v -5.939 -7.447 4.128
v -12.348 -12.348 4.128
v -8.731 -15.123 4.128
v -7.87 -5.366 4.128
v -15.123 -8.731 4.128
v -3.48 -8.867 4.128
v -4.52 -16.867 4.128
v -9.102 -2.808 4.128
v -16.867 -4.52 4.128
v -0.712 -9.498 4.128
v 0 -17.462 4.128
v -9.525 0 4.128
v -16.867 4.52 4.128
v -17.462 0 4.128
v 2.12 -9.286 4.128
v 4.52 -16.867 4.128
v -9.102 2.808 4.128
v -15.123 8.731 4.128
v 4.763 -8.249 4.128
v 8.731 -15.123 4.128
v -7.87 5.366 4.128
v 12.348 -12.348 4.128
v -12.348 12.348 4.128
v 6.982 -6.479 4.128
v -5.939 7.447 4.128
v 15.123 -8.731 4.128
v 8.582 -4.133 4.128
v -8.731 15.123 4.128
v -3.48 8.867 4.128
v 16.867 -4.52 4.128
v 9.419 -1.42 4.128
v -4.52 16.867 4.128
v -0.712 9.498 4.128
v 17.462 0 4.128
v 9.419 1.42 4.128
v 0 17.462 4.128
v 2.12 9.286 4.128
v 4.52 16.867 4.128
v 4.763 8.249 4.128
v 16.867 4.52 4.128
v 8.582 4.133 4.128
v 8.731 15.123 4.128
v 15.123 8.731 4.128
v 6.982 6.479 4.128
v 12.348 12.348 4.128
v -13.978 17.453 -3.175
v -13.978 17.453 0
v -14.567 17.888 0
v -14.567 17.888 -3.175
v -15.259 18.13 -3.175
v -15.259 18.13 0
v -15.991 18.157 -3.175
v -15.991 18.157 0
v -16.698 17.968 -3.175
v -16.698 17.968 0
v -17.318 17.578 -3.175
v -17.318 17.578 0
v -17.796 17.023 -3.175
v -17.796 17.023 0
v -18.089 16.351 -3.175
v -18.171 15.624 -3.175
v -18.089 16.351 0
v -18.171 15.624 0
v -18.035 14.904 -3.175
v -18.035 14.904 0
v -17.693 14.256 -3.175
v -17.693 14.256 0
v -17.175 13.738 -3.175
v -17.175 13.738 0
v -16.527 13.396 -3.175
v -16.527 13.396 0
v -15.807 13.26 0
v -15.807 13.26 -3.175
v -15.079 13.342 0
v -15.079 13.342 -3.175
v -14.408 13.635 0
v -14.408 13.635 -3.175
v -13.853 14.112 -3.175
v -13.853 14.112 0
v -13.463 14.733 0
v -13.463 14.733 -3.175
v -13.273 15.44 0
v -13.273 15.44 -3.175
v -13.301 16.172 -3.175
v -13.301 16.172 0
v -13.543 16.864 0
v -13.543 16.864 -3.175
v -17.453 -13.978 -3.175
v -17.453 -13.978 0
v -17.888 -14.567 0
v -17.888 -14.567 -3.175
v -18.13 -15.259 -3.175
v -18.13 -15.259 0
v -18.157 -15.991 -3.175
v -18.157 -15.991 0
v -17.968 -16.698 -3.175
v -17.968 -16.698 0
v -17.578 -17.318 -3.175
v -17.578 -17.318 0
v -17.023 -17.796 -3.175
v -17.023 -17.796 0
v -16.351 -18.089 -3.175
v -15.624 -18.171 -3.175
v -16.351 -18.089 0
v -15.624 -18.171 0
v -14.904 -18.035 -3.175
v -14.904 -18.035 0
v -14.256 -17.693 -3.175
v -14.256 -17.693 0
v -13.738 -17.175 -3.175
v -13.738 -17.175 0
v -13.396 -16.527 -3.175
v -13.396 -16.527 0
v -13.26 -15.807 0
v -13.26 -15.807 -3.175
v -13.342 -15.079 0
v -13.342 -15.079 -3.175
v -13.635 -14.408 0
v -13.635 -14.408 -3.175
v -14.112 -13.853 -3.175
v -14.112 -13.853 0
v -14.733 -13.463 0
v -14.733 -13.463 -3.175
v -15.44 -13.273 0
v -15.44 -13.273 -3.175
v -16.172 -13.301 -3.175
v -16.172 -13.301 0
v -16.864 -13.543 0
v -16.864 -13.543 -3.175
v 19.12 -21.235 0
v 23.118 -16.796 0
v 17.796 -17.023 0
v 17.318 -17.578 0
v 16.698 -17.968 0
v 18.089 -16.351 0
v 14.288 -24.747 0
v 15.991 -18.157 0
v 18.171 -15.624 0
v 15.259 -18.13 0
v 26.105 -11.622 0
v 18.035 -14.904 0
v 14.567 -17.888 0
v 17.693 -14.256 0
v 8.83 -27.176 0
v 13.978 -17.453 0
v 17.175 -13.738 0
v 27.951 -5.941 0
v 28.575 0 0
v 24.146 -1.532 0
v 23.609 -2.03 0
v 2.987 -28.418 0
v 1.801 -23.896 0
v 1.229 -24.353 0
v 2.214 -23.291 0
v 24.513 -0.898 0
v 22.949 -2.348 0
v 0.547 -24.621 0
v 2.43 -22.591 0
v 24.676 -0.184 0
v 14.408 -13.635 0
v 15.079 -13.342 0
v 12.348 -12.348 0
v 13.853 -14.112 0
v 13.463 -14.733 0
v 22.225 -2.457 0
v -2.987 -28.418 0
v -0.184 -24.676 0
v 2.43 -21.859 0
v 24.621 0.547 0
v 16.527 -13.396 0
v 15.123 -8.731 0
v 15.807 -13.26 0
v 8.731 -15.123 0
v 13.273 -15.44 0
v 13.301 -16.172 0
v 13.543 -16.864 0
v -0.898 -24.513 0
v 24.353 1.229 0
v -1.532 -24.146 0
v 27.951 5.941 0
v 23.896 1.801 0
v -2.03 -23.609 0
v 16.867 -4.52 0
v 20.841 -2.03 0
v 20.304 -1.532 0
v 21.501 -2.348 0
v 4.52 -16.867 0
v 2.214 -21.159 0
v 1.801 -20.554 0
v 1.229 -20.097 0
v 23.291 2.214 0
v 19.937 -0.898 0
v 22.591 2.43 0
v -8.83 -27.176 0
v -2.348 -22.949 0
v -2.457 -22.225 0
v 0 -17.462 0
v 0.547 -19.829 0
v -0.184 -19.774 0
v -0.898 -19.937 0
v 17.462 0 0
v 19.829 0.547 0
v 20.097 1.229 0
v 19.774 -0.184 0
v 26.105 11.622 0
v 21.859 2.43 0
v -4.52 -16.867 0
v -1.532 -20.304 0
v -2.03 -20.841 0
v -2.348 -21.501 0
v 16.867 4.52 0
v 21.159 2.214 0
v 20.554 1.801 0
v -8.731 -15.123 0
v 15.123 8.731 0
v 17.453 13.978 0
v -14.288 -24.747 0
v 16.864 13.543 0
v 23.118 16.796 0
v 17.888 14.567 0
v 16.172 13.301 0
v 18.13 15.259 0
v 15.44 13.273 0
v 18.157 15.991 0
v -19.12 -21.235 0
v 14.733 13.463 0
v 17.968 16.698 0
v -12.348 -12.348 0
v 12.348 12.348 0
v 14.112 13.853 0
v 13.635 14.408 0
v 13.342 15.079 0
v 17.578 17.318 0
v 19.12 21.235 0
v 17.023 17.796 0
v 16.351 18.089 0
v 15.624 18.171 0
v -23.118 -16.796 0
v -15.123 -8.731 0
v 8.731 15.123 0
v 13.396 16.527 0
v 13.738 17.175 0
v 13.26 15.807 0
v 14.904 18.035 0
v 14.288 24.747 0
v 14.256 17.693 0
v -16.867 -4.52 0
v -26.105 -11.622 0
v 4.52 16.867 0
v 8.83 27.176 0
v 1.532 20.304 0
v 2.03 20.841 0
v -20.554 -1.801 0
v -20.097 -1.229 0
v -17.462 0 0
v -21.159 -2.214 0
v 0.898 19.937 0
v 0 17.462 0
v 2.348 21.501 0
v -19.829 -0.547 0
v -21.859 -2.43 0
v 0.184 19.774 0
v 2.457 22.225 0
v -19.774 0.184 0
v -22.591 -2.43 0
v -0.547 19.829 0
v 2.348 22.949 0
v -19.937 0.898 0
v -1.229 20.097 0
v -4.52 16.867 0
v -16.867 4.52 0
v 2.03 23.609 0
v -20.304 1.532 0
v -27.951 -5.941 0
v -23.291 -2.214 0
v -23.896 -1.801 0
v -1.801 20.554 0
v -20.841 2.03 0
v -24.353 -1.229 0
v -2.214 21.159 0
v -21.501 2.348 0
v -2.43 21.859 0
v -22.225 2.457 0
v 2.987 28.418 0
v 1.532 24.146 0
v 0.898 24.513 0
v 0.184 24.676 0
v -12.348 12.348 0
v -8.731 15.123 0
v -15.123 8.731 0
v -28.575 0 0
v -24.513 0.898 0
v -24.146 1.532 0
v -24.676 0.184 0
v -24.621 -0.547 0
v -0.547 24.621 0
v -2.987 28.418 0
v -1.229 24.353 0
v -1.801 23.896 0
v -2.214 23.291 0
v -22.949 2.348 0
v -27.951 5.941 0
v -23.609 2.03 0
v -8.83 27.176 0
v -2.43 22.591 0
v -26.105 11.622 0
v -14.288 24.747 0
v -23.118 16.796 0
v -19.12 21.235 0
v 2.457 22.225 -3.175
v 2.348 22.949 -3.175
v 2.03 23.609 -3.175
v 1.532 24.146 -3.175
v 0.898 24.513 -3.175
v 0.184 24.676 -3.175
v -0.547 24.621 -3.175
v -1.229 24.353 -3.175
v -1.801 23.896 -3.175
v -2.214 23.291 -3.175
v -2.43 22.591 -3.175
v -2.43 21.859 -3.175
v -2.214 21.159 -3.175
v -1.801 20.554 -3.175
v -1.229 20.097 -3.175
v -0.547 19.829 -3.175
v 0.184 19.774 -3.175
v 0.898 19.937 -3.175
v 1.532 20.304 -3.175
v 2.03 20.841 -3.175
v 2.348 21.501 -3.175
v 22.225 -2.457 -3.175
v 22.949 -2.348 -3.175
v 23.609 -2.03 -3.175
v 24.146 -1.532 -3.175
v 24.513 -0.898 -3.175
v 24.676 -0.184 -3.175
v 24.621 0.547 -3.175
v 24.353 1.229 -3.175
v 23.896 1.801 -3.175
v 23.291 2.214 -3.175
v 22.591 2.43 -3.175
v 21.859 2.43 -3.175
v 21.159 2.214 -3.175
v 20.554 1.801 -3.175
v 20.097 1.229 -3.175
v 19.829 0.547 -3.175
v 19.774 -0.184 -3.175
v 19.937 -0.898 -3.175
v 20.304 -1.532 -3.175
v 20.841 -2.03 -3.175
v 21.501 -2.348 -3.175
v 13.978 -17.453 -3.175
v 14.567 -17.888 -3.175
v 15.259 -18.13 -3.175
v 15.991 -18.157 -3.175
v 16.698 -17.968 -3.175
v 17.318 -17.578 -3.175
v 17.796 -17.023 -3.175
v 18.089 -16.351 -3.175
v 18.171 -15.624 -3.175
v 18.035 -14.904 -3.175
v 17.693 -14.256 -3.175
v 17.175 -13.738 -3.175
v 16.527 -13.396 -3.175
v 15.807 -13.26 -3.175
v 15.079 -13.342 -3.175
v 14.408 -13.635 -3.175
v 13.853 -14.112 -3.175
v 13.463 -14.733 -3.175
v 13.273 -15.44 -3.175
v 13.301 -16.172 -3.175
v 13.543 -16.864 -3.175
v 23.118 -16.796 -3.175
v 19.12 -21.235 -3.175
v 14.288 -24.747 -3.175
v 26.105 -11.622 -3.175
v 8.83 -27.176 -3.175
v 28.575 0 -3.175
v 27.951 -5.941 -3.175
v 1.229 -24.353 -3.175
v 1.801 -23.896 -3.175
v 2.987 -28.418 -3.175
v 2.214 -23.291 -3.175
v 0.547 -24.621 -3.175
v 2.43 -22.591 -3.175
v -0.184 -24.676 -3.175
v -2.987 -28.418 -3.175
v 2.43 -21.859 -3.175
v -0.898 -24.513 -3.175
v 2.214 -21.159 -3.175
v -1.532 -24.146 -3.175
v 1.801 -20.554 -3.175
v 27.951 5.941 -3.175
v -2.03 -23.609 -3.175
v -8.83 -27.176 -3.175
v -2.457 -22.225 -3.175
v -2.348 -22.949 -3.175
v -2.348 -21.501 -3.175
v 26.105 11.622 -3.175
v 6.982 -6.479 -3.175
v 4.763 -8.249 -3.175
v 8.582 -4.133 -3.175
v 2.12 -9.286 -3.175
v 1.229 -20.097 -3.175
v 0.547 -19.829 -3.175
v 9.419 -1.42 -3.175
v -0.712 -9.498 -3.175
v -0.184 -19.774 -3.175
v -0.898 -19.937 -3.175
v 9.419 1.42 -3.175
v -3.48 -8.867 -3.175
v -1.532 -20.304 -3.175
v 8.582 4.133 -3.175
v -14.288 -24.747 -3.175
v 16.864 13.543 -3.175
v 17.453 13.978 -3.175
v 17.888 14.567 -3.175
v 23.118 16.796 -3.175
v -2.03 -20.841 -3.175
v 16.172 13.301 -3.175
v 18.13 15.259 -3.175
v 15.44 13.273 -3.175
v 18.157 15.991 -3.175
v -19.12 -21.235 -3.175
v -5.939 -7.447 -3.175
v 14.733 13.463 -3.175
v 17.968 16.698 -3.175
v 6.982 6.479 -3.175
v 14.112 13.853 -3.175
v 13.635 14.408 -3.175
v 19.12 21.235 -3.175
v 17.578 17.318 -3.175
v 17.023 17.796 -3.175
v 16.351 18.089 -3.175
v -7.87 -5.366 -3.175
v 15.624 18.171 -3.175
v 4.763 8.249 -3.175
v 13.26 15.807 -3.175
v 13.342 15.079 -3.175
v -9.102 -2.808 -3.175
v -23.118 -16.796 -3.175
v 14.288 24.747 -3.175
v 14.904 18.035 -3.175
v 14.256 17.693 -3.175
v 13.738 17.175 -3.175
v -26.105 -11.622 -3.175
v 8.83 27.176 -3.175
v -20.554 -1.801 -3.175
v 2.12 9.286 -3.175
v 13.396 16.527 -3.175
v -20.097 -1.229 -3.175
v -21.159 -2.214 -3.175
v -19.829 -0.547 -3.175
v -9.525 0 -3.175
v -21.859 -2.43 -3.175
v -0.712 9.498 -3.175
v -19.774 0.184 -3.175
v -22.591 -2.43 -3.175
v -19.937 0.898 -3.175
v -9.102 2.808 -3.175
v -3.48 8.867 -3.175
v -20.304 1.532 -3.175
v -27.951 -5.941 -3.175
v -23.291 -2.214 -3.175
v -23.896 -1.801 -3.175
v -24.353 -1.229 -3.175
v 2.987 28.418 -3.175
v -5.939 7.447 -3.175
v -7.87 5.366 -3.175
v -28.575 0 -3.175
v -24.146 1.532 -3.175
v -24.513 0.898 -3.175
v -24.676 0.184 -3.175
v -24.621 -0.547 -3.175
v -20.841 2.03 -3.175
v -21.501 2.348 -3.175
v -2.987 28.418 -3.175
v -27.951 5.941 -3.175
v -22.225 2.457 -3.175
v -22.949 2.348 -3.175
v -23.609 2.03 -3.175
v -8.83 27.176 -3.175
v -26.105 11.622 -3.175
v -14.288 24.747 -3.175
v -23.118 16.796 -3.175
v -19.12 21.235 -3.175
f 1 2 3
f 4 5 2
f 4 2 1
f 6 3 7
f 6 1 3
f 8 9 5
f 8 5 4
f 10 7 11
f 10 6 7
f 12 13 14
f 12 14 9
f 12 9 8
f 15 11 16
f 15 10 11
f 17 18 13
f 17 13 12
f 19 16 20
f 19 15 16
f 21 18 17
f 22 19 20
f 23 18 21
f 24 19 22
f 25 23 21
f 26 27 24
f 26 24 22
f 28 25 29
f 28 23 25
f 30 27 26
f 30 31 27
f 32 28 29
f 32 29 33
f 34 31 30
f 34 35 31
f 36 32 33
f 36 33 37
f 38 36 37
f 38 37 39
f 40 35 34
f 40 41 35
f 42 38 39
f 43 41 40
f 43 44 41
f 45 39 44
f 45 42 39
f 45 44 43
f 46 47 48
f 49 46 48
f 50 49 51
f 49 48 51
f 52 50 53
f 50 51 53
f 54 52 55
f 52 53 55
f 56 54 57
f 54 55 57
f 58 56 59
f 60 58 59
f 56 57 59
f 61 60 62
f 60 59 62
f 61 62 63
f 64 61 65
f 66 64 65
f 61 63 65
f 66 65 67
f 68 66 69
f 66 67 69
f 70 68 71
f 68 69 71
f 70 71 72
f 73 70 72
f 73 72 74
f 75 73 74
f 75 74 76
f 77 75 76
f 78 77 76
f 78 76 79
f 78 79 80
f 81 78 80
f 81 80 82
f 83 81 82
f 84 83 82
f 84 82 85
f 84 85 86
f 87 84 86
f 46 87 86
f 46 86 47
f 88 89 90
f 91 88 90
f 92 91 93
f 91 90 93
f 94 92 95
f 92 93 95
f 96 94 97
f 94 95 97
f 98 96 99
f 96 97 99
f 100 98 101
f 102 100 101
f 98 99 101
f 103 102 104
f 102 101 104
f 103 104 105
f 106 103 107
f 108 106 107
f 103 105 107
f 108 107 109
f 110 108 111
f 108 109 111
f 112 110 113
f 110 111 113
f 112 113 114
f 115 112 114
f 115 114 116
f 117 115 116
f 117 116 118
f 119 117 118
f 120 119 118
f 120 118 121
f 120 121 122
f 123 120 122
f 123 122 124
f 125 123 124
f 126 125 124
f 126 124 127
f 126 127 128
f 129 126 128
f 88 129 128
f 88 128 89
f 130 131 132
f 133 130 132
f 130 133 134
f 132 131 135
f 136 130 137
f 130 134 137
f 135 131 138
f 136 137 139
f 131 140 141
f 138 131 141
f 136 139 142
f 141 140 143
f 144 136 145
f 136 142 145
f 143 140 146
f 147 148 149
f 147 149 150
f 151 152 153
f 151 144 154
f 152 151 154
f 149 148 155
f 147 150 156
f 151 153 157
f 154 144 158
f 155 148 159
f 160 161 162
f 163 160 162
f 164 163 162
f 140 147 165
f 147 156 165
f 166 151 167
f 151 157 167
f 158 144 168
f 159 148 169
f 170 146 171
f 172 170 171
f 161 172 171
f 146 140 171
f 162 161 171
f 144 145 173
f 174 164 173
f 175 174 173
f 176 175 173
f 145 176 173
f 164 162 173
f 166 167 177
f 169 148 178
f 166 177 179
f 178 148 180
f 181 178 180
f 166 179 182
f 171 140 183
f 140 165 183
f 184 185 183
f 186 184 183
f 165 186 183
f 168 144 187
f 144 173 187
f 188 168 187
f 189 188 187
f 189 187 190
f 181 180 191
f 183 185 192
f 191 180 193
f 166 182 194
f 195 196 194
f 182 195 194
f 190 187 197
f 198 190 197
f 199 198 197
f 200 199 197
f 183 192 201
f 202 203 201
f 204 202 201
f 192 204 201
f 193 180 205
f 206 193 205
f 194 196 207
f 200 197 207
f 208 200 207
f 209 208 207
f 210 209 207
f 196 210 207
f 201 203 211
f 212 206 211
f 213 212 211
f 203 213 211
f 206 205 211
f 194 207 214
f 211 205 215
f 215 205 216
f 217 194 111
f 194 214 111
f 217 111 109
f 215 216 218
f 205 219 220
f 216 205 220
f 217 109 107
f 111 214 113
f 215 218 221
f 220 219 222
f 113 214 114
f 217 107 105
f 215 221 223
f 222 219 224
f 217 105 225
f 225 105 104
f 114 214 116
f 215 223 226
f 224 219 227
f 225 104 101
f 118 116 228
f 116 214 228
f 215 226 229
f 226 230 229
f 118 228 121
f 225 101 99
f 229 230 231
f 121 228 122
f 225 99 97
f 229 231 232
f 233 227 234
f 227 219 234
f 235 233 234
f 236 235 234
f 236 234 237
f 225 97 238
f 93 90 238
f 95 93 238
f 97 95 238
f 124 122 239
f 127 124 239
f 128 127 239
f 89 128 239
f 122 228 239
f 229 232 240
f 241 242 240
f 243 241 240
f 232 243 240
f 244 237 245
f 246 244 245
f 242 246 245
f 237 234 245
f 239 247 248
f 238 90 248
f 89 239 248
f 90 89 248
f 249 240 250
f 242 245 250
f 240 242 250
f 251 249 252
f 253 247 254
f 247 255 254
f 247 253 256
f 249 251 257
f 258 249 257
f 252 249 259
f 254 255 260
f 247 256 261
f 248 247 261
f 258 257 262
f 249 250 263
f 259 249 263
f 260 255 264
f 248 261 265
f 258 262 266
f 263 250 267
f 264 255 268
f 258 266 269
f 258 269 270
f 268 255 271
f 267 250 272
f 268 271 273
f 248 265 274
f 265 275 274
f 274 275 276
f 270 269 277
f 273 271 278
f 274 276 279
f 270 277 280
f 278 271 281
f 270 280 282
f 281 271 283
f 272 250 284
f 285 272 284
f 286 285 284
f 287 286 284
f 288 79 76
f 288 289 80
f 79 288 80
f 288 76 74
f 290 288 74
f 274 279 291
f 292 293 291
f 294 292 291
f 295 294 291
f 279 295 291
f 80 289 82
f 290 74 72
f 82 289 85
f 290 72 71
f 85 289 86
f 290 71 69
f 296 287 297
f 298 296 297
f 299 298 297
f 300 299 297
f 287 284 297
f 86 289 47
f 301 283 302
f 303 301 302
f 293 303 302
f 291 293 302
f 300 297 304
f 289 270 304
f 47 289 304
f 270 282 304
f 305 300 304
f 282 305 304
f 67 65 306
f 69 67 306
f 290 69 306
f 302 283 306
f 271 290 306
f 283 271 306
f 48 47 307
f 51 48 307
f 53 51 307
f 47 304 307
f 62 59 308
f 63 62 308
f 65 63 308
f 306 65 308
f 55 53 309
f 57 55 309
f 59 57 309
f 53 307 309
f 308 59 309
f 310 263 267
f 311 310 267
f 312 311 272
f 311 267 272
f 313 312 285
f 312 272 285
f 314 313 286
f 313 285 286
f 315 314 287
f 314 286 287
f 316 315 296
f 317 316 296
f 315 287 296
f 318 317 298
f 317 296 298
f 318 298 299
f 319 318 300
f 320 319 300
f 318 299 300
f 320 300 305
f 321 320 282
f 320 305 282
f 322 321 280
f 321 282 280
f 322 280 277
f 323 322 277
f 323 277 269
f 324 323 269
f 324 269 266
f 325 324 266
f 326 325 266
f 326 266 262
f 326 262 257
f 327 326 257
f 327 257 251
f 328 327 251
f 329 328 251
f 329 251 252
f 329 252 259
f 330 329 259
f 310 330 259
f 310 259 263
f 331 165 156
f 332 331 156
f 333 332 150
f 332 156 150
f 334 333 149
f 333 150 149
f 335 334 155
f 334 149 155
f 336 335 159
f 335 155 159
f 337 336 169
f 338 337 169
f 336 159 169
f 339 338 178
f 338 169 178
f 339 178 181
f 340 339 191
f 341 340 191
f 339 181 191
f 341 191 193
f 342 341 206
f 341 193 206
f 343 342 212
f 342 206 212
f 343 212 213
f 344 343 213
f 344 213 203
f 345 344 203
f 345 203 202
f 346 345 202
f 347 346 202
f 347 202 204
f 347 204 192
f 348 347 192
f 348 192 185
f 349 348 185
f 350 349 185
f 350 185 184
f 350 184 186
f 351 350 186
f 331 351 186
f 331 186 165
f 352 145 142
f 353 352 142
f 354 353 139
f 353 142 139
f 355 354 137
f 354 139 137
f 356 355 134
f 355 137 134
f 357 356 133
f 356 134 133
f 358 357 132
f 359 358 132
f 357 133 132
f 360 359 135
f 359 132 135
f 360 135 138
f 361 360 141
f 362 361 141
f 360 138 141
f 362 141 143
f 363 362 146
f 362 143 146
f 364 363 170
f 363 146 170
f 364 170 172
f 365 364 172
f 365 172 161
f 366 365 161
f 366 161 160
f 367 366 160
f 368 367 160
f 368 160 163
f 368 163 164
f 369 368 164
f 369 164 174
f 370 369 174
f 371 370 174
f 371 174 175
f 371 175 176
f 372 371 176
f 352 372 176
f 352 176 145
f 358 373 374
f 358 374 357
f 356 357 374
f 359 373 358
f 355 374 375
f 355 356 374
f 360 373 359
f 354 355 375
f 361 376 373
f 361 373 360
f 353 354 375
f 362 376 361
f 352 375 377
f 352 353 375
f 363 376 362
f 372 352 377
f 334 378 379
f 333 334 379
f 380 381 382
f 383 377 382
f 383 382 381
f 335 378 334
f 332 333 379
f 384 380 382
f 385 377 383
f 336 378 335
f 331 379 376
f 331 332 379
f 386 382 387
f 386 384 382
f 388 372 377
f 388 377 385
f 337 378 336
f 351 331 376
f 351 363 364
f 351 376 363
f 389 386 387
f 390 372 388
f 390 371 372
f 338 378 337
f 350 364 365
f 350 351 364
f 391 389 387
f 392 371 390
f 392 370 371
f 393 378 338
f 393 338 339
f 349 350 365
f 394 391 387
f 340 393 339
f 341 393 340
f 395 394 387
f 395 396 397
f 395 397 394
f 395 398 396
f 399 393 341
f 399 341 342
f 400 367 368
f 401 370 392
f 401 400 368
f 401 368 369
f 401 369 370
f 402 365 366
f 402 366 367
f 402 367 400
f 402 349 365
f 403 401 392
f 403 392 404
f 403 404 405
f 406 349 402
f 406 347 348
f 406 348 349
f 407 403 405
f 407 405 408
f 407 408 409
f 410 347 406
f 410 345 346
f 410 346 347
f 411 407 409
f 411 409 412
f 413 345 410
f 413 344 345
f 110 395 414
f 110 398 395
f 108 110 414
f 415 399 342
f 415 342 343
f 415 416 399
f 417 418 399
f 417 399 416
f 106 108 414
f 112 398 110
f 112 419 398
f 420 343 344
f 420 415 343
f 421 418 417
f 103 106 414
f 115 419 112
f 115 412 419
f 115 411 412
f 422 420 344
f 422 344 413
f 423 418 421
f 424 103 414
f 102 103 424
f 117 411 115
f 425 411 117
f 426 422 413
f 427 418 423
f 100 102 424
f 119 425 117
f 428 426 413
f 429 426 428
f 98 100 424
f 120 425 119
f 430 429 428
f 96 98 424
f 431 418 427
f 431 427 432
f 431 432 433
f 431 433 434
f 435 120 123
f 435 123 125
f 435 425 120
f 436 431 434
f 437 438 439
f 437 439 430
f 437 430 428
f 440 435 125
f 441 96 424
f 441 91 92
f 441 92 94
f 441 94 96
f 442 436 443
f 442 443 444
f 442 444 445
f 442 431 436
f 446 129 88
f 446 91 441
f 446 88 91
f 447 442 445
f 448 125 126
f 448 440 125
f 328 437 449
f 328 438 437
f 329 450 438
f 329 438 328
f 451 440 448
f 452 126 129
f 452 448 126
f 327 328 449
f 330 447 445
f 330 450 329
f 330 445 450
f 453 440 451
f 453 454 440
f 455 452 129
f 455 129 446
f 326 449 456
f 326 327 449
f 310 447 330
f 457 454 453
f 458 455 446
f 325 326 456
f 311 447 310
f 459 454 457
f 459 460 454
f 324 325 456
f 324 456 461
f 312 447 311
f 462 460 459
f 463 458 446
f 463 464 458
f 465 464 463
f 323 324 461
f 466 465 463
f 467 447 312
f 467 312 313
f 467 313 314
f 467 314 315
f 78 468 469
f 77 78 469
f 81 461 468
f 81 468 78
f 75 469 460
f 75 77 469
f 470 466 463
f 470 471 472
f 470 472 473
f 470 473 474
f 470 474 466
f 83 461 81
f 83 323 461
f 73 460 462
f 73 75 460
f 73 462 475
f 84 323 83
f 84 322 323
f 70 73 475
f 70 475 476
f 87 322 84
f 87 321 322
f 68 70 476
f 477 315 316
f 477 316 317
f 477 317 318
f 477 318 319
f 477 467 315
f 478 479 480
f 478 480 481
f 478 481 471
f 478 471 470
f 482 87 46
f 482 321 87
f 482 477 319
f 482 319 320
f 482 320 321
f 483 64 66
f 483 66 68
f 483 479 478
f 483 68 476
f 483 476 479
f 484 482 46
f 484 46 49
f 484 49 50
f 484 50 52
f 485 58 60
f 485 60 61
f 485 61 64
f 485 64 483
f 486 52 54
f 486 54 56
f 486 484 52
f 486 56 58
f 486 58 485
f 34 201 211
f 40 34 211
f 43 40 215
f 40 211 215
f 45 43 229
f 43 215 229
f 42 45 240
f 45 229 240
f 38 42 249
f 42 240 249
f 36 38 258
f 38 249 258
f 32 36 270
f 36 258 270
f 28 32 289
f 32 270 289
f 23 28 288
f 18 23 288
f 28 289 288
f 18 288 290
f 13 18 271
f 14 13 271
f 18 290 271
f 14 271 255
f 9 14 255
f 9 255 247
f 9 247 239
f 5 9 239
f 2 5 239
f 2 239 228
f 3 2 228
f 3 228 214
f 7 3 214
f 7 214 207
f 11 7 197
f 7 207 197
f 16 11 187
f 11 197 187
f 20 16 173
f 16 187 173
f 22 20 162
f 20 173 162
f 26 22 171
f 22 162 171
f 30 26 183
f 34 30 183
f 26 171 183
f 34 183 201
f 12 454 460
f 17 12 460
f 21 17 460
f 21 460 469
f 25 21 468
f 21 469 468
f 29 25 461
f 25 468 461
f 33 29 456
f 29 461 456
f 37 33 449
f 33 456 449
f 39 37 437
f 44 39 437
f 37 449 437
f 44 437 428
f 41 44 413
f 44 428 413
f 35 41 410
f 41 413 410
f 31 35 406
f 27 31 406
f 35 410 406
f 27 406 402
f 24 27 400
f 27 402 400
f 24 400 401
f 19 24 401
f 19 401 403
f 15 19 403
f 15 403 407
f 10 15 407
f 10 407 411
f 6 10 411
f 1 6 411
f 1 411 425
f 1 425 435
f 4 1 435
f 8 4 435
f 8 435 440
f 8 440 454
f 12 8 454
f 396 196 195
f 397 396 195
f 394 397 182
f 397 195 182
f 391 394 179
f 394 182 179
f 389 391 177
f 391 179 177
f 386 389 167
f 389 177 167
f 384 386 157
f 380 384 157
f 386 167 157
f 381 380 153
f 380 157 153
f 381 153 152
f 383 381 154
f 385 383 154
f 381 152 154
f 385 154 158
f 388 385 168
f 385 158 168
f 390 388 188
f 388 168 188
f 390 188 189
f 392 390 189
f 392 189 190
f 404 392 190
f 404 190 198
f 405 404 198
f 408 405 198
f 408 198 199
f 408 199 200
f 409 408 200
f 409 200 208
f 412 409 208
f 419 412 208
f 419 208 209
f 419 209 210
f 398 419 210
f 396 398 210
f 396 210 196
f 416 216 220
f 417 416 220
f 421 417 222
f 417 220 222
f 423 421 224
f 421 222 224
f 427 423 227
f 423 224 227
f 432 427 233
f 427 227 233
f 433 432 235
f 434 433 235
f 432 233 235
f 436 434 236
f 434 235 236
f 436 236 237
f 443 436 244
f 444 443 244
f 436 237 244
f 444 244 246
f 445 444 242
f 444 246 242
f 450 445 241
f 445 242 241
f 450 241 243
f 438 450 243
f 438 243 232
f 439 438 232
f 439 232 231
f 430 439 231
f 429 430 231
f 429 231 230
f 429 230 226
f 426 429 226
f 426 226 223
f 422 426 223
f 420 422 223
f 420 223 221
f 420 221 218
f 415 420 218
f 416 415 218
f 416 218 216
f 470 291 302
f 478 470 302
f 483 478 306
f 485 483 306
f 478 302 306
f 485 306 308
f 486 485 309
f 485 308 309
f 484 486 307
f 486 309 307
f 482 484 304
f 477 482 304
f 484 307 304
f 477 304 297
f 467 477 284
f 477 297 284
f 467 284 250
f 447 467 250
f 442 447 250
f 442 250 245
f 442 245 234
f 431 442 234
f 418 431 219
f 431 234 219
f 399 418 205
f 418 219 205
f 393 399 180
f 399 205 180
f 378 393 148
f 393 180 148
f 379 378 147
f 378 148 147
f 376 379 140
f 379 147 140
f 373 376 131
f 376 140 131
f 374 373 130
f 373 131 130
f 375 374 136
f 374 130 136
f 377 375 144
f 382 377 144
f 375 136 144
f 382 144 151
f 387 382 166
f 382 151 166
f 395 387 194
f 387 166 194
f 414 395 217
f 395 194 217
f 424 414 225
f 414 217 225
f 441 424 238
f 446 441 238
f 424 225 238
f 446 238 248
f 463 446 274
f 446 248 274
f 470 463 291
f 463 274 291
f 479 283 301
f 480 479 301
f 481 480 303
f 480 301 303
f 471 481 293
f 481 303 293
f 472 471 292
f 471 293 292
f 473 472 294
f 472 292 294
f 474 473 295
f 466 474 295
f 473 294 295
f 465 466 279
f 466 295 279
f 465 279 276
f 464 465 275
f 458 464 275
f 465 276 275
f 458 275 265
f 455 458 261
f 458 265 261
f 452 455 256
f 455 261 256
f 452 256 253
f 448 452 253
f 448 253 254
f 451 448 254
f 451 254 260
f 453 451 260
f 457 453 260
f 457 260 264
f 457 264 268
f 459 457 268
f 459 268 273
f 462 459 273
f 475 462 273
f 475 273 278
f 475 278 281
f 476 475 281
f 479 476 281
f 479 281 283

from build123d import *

# Parameters (mm, degrees)
SKETCH1_R                    = 17.4625
BOSS_EXTRUDE1_DEPTH          = 4.1275
SKETCH2_R                    = 28.575
BOSS_EXTRUDE2_DEPTH          = 3.175
F_10_0_1935_DIAMETER_HOLE1_D = 4.9149
CIRPATTERN1_COUNT            = 8
CUT_EXTRUDE1_REACH           = 43.066
SKETCH5_R                    = 9.525


with BuildPart() as part:
    # Sketch1 → Boss-Extrude1 (new body)
    with BuildSketch(Plane.XY):
        Circle(SKETCH1_R)
    extrude(amount=BOSS_EXTRUDE1_DEPTH)

    # Sketch2 → Boss-Extrude2 (add)
    with BuildSketch(Plane(origin=(0, 0, 0), x_dir=(-1, 0, 0), z_dir=(0, 0, -1))):
        Circle(SKETCH2_R)
    extrude(amount=BOSS_EXTRUDE2_DEPTH)

    # #10 (0.1935) Diameter Hole1 (through all)
    with Locations(Plane(origin=(0, 0, -3.175), x_dir=(-1, 0, 0), z_dir=(0, 0, -1))):
        with Locations((0, 22.225)):
            f_10_0_1935_diameter_hole1 = Hole(F_10_0_1935_DIAMETER_HOLE1_D / 2)

    # CirPattern1: #10 (0.1935) Diameter Hole1 ×8 about axis
    cirpattern1_axis = Axis((0, 0, 0), (0, 0, 1))
    for i in range(1, CIRPATTERN1_COUNT):
        add(f_10_0_1935_diameter_hole1.rotate(cirpattern1_axis, i * 360 / CIRPATTERN1_COUNT), mode=Mode.SUBTRACT)

    # Sketch5 → Cut-Extrude1 (cut, up to next)
    with BuildSketch(Plane(origin=(0, 0, -3.175), x_dir=(-1, 0, 0), z_dir=(0, 0, -1)), mode=Mode.PRIVATE) as cut_extrude1_sk1:
        Circle(SKETCH5_R)
    cut_extrude1_tool1 = extrude(cut_extrude1_sk1.sketch, amount=-CUT_EXTRUDE1_REACH, mode=Mode.PRIVATE) & part.part
    add(cut_extrude1_tool1.solids().sort_by_distance((0, 0, -3.175))[0], mode=Mode.SUBTRACT)


solid = part.part
